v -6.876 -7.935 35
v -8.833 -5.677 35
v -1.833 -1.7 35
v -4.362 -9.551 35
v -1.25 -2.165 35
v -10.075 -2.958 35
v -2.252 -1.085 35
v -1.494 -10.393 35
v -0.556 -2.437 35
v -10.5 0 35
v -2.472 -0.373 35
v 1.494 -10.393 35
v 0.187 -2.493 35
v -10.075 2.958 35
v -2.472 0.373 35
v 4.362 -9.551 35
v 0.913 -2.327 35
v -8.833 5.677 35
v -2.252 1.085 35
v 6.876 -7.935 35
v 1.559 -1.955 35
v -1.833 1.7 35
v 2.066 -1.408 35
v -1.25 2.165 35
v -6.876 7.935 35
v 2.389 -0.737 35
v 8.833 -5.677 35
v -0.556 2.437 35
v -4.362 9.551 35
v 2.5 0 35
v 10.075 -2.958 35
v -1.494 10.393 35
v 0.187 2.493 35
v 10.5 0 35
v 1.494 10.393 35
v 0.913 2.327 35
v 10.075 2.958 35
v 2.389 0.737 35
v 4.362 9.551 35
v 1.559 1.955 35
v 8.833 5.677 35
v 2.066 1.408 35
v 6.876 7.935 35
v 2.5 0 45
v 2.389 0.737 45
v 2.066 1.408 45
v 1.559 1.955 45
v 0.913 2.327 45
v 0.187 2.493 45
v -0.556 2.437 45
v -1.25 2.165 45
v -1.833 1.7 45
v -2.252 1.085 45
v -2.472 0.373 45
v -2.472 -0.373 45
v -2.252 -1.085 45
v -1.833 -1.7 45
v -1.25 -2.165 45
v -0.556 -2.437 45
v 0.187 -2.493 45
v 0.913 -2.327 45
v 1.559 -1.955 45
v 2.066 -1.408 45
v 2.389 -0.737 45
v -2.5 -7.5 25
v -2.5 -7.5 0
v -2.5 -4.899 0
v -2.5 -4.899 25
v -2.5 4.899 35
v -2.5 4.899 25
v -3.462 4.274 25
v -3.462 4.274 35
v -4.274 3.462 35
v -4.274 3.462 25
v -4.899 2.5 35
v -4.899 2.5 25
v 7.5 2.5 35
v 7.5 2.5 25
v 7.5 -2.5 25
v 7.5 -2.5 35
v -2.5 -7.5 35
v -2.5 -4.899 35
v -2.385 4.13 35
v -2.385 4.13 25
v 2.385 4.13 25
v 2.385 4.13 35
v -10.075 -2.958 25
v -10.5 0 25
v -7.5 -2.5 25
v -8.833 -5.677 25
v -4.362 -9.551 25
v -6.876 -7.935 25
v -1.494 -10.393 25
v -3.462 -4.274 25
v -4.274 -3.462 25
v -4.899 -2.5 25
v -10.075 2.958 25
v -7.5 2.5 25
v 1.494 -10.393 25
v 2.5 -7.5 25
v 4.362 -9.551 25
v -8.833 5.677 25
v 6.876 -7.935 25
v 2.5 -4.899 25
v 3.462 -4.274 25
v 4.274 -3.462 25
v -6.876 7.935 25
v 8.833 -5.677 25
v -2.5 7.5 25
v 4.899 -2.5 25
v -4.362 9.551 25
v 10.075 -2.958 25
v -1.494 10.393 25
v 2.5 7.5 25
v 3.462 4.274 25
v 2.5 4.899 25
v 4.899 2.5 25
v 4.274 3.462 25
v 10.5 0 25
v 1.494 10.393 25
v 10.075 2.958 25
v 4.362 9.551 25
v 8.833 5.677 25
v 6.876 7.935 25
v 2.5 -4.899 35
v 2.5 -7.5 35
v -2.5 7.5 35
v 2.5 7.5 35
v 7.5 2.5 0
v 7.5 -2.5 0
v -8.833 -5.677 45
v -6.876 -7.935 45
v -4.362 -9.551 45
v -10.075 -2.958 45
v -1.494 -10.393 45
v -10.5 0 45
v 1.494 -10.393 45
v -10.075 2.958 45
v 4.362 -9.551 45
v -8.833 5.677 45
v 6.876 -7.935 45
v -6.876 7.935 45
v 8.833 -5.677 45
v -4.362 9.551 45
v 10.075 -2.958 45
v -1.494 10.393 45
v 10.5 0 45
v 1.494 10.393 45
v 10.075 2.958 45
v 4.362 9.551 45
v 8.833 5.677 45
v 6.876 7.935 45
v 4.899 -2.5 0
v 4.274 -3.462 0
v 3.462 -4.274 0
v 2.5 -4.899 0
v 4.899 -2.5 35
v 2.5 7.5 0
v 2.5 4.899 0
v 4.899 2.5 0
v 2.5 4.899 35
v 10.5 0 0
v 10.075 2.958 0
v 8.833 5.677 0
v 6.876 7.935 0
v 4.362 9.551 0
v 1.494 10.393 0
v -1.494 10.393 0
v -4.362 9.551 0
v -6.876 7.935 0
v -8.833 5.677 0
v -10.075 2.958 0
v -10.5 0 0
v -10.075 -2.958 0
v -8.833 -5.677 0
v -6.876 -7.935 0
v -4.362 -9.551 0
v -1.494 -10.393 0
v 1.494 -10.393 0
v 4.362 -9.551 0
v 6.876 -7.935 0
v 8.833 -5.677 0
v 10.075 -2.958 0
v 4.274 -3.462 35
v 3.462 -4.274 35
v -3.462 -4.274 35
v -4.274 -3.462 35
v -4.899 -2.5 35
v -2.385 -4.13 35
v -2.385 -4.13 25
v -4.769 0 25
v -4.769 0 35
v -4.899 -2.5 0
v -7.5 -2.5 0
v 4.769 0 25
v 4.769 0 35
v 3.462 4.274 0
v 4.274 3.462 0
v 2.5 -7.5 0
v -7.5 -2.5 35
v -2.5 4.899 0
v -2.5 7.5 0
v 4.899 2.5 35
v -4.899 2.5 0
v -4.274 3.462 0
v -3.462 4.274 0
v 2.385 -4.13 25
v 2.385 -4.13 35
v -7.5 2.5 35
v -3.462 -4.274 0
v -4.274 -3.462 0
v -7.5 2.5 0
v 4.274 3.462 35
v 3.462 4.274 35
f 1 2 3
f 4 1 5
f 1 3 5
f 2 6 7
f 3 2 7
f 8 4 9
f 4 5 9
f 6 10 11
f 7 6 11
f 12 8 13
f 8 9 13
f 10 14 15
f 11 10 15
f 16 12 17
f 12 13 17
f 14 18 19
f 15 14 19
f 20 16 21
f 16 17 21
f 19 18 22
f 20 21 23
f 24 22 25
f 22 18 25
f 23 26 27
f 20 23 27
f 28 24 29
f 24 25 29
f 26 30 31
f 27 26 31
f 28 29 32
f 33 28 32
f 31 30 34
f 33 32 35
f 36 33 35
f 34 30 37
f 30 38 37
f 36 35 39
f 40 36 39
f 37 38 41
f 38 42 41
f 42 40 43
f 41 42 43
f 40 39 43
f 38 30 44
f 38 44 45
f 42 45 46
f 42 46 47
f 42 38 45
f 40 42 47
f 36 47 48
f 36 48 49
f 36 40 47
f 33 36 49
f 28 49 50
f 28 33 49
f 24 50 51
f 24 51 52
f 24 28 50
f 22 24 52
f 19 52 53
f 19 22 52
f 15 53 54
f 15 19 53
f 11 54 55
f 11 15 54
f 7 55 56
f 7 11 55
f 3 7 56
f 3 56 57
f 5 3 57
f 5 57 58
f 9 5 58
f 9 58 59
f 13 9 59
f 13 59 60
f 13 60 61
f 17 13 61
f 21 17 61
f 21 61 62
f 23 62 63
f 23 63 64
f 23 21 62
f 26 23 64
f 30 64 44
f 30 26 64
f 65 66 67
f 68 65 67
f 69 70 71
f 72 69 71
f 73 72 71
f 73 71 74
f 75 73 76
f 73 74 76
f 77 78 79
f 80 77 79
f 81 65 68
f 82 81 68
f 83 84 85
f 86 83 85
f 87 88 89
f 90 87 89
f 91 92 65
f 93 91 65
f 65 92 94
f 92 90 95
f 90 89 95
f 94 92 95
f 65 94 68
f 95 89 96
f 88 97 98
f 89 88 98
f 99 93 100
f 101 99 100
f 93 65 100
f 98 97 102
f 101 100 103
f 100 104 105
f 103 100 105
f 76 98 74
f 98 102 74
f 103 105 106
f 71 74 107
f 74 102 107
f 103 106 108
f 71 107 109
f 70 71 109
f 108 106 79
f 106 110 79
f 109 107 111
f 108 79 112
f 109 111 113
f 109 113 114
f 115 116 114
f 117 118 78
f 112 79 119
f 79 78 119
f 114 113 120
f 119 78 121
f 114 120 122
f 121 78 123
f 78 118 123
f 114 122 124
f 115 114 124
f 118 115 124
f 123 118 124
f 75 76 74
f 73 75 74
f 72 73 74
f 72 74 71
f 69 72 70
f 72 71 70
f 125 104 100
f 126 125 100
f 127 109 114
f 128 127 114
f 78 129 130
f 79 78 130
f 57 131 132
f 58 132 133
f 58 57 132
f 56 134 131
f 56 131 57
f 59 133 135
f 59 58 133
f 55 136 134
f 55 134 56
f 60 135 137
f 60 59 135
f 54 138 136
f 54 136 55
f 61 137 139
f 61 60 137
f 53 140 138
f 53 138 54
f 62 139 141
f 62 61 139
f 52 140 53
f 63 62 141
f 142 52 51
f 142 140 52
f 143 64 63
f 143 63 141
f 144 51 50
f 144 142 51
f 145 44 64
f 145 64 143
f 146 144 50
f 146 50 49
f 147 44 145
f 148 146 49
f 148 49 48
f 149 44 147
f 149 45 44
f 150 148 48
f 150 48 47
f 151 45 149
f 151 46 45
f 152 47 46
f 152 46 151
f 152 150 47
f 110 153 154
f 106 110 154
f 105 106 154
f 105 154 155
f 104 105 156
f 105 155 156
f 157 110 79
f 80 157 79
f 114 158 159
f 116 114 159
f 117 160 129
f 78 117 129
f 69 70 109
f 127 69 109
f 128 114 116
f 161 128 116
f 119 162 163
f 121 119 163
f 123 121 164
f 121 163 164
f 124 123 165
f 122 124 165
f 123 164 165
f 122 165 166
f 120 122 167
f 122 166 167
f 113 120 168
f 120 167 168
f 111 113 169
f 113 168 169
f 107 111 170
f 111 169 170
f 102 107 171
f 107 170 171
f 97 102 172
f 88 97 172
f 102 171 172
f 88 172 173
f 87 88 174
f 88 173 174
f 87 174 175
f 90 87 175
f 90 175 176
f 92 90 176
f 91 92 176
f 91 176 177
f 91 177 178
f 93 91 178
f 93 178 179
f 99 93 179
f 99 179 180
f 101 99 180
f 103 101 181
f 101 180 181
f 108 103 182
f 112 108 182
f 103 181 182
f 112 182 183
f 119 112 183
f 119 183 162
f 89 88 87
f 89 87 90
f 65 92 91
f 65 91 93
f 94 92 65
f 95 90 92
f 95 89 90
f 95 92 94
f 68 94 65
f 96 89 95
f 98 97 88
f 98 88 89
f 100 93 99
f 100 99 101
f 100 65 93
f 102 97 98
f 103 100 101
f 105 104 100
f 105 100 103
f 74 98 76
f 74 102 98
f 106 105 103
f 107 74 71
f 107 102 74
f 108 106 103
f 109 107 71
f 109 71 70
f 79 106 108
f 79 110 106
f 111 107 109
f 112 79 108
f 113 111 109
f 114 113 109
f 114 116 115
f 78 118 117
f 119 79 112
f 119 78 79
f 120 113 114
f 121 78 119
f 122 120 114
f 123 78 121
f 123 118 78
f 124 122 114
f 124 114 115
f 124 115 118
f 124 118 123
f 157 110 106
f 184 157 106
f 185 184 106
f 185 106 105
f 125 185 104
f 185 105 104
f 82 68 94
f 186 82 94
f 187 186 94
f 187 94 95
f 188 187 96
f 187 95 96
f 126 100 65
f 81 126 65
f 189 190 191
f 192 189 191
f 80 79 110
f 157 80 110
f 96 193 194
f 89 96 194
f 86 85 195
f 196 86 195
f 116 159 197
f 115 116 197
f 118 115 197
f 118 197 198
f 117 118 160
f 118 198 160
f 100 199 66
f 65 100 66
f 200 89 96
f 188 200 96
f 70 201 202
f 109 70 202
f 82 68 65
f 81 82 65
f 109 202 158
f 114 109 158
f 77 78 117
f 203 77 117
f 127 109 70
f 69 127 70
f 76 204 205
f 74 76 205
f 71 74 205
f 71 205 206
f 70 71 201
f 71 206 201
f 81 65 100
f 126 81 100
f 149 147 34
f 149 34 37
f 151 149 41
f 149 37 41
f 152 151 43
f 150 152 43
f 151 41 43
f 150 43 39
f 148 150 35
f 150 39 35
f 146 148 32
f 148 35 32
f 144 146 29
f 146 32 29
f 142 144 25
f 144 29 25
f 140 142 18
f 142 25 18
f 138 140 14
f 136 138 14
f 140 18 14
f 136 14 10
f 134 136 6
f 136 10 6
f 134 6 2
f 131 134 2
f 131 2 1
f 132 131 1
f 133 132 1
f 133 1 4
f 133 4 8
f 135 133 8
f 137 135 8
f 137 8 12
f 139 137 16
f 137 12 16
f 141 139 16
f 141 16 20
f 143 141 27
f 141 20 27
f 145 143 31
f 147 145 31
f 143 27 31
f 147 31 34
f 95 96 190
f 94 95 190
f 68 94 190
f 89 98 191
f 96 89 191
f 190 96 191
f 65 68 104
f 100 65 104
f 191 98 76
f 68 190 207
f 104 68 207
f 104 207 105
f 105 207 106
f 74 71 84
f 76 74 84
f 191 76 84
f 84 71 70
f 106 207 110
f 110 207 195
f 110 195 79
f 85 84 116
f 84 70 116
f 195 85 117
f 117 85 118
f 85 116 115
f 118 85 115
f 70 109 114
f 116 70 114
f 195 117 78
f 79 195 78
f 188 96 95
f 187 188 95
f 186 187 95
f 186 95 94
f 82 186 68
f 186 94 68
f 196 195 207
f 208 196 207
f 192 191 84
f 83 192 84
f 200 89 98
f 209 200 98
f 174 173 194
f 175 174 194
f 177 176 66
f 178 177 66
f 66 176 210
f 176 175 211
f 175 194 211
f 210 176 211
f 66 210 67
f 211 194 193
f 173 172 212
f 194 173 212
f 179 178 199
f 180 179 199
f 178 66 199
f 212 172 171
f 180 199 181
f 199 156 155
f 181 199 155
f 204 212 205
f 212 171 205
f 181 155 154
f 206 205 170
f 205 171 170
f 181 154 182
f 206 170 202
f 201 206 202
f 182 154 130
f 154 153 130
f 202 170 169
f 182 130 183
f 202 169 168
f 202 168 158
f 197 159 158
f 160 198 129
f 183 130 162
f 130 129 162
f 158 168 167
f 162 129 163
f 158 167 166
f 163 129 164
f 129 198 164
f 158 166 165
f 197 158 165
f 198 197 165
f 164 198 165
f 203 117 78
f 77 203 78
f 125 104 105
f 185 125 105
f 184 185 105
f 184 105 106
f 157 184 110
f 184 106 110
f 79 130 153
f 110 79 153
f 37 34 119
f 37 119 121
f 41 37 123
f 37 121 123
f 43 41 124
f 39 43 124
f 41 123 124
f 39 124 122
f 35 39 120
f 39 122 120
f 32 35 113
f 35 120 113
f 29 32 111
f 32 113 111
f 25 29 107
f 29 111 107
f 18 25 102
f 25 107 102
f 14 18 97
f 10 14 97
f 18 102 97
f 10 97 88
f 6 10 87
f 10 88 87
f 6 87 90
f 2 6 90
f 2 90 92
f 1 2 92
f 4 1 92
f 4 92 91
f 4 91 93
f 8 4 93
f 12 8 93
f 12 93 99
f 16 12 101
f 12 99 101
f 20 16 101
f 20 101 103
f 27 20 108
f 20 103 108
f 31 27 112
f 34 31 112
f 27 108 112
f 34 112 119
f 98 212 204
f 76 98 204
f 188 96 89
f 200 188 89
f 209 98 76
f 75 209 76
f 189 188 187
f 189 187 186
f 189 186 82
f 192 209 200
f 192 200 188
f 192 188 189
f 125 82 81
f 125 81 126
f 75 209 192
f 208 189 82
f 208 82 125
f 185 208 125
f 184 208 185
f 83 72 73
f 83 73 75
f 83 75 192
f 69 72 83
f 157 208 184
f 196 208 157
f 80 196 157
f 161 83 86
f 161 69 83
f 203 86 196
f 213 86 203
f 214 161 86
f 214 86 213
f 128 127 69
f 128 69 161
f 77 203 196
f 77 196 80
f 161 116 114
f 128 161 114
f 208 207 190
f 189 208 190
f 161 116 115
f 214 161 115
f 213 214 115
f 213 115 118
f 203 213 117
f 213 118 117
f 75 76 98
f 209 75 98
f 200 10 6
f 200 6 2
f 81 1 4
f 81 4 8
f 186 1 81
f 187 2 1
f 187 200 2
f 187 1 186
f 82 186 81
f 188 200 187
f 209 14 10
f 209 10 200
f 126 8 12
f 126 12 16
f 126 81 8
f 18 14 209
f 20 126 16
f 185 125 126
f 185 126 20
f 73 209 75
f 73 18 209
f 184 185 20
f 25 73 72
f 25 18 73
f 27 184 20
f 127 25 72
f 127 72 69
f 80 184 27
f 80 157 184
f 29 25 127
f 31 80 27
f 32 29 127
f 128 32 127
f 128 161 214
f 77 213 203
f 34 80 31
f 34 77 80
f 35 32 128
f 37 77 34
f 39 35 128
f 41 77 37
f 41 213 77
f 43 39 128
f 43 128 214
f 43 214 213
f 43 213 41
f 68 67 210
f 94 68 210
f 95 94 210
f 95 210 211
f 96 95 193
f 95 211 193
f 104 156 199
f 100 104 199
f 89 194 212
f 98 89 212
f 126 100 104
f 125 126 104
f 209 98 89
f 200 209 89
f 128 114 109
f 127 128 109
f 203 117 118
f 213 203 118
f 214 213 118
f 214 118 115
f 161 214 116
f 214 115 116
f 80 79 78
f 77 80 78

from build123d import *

# Parameters (mm, degrees)
F0_R      = 10.5
F1_DEPTH  = 25
F3_DEPTH  = 10
F1_FACE_R = 10.5
F4_DEPTH  = 10
F5_R      = 10.5
F5_R_2    = 2.5
F6_DEPTH  = 10


with BuildPart() as f1:
    # F0 (on Top) → F1 (new body)
    with BuildSketch(Plane.XY):
        Circle(F0_R)
        with BuildLine():
            ThreePointArc((-2.5, -4.898979), (-3.889087, -3.889087), (-4.898979, -2.5))
            Line((-4.898979, -2.5), (-7.5, -2.5))
            Line((-7.5, -2.5), (-7.5, 2.5))
            Line((-7.5, 2.5), (-4.898979, 2.5))
            ThreePointArc((-4.898979, 2.5), (-3.889087, 3.889087), (-2.5, 4.898979))
            Line((-2.5, 4.898979), (-2.5, 7.5))
            Line((-2.5, 7.5), (2.5, 7.5))
            Line((2.5, 7.5), (2.5, 4.898979))
            ThreePointArc((2.5, 4.898979), (3.889087, 3.889087), (4.898979, 2.5))
            Line((4.898979, 2.5), (7.5, 2.5))
            Line((7.5, 2.5), (7.5, -2.5))
            Line((7.5, -2.5), (4.898979, -2.5))
            ThreePointArc((4.898979, -2.5), (3.889087, -3.889087), (2.5, -4.898979))
            Line((2.5, -4.898979), (2.5, -7.5))
            Line((2.5, -7.5), (-2.5, -7.5))
            Line((-2.5, -7.5), (-2.5, -4.898979))
        make_face(mode=Mode.SUBTRACT)
    extrude(amount=F1_DEPTH)


with BuildPart() as f3:
    # F2 (on face) → F3 (new body)
    with BuildSketch(Plane.XY.offset(25)):
        with BuildLine():
            ThreePointArc((-4.898979, -2.5), (-3.889087, -3.889087), (-2.5, -4.898979))
            Line((-2.5, -4.898979), (-2.5, -7.5))
            Line((-2.5, -7.5), (2.5, -7.5))
            Line((2.5, -7.5), (2.5, -4.898979))
            ThreePointArc((2.5, -4.898979), (3.889087, -3.889087), (4.898979, -2.5))
            Line((4.898979, -2.5), (7.5, -2.5))
            Line((7.5, -2.5), (7.5, 2.5))
            Line((7.5, 2.5), (4.898979, 2.5))
            ThreePointArc((4.898979, 2.5), (3.889087, 3.889087), (2.5, 4.898979))
            Line((2.5, 4.898979), (2.5, 7.5))
            Line((2.5, 7.5), (-2.5, 7.5))
            Line((-2.5, 7.5), (-2.5, 4.898979))
            ThreePointArc((-2.5, 4.898979), (-3.889087, 3.889087), (-4.898979, 2.5))
            Line((-4.898979, 2.5), (-7.5, 2.5))
            Line((-7.5, 2.5), (-7.5, -2.5))
            Line((-7.5, -2.5), (-4.898979, -2.5))
        make_face()
        Polygon((4.769471, 0), (2.384736, -4.130483), (-2.384736, -4.130483), (-4.769471, 0), (-2.384736, 4.130483), (2.384736, 4.130483), align=None, mode=Mode.SUBTRACT)
    extrude(amount=F3_DEPTH)


with BuildPart() as f4:
    # F1_face (on face) → F4 (new body)
    with BuildSketch(Plane.XY.offset(25)):
        Circle(F1_FACE_R)
        with BuildLine():
            ThreePointArc((-2.5, -4.898979), (-3.889087, -3.889087), (-4.898979, -2.5))
            Line((-4.898979, -2.5), (-7.5, -2.5))
            Line((-7.5, -2.5), (-7.5, 2.5))
            Line((-7.5, 2.5), (-4.898979, 2.5))
            ThreePointArc((-4.898979, 2.5), (-3.889087, 3.889087), (-2.5, 4.898979))
            Line((-2.5, 4.898979), (-2.5, 7.5))
            Line((-2.5, 7.5), (2.5, 7.5))
            Line((2.5, 7.5), (2.5, 4.898979))
            ThreePointArc((2.5, 4.898979), (3.889087, 3.889087), (4.898979, 2.5))
            Line((4.898979, 2.5), (7.5, 2.5))
            Line((7.5, 2.5), (7.5, -2.5))
            Line((7.5, -2.5), (4.898979, -2.5))
            ThreePointArc((4.898979, -2.5), (3.889087, -3.889087), (2.5, -4.898979))
            Line((2.5, -4.898979), (2.5, -7.5))
            Line((2.5, -7.5), (-2.5, -7.5))
            Line((-2.5, -7.5), (-2.5, -4.898979))
        make_face(mode=Mode.SUBTRACT)
    extrude(amount=F4_DEPTH)


with BuildPart() as f6:
    # F5 (on face) → F6 (new body)
    with BuildSketch(Plane.XY.offset(35)):
        Circle(F5_R)
        Circle(F5_R_2, mode=Mode.SUBTRACT)
    extrude(amount=F6_DEPTH)


solid = Compound([f1.part, f3.part, f4.part, f6.part])
